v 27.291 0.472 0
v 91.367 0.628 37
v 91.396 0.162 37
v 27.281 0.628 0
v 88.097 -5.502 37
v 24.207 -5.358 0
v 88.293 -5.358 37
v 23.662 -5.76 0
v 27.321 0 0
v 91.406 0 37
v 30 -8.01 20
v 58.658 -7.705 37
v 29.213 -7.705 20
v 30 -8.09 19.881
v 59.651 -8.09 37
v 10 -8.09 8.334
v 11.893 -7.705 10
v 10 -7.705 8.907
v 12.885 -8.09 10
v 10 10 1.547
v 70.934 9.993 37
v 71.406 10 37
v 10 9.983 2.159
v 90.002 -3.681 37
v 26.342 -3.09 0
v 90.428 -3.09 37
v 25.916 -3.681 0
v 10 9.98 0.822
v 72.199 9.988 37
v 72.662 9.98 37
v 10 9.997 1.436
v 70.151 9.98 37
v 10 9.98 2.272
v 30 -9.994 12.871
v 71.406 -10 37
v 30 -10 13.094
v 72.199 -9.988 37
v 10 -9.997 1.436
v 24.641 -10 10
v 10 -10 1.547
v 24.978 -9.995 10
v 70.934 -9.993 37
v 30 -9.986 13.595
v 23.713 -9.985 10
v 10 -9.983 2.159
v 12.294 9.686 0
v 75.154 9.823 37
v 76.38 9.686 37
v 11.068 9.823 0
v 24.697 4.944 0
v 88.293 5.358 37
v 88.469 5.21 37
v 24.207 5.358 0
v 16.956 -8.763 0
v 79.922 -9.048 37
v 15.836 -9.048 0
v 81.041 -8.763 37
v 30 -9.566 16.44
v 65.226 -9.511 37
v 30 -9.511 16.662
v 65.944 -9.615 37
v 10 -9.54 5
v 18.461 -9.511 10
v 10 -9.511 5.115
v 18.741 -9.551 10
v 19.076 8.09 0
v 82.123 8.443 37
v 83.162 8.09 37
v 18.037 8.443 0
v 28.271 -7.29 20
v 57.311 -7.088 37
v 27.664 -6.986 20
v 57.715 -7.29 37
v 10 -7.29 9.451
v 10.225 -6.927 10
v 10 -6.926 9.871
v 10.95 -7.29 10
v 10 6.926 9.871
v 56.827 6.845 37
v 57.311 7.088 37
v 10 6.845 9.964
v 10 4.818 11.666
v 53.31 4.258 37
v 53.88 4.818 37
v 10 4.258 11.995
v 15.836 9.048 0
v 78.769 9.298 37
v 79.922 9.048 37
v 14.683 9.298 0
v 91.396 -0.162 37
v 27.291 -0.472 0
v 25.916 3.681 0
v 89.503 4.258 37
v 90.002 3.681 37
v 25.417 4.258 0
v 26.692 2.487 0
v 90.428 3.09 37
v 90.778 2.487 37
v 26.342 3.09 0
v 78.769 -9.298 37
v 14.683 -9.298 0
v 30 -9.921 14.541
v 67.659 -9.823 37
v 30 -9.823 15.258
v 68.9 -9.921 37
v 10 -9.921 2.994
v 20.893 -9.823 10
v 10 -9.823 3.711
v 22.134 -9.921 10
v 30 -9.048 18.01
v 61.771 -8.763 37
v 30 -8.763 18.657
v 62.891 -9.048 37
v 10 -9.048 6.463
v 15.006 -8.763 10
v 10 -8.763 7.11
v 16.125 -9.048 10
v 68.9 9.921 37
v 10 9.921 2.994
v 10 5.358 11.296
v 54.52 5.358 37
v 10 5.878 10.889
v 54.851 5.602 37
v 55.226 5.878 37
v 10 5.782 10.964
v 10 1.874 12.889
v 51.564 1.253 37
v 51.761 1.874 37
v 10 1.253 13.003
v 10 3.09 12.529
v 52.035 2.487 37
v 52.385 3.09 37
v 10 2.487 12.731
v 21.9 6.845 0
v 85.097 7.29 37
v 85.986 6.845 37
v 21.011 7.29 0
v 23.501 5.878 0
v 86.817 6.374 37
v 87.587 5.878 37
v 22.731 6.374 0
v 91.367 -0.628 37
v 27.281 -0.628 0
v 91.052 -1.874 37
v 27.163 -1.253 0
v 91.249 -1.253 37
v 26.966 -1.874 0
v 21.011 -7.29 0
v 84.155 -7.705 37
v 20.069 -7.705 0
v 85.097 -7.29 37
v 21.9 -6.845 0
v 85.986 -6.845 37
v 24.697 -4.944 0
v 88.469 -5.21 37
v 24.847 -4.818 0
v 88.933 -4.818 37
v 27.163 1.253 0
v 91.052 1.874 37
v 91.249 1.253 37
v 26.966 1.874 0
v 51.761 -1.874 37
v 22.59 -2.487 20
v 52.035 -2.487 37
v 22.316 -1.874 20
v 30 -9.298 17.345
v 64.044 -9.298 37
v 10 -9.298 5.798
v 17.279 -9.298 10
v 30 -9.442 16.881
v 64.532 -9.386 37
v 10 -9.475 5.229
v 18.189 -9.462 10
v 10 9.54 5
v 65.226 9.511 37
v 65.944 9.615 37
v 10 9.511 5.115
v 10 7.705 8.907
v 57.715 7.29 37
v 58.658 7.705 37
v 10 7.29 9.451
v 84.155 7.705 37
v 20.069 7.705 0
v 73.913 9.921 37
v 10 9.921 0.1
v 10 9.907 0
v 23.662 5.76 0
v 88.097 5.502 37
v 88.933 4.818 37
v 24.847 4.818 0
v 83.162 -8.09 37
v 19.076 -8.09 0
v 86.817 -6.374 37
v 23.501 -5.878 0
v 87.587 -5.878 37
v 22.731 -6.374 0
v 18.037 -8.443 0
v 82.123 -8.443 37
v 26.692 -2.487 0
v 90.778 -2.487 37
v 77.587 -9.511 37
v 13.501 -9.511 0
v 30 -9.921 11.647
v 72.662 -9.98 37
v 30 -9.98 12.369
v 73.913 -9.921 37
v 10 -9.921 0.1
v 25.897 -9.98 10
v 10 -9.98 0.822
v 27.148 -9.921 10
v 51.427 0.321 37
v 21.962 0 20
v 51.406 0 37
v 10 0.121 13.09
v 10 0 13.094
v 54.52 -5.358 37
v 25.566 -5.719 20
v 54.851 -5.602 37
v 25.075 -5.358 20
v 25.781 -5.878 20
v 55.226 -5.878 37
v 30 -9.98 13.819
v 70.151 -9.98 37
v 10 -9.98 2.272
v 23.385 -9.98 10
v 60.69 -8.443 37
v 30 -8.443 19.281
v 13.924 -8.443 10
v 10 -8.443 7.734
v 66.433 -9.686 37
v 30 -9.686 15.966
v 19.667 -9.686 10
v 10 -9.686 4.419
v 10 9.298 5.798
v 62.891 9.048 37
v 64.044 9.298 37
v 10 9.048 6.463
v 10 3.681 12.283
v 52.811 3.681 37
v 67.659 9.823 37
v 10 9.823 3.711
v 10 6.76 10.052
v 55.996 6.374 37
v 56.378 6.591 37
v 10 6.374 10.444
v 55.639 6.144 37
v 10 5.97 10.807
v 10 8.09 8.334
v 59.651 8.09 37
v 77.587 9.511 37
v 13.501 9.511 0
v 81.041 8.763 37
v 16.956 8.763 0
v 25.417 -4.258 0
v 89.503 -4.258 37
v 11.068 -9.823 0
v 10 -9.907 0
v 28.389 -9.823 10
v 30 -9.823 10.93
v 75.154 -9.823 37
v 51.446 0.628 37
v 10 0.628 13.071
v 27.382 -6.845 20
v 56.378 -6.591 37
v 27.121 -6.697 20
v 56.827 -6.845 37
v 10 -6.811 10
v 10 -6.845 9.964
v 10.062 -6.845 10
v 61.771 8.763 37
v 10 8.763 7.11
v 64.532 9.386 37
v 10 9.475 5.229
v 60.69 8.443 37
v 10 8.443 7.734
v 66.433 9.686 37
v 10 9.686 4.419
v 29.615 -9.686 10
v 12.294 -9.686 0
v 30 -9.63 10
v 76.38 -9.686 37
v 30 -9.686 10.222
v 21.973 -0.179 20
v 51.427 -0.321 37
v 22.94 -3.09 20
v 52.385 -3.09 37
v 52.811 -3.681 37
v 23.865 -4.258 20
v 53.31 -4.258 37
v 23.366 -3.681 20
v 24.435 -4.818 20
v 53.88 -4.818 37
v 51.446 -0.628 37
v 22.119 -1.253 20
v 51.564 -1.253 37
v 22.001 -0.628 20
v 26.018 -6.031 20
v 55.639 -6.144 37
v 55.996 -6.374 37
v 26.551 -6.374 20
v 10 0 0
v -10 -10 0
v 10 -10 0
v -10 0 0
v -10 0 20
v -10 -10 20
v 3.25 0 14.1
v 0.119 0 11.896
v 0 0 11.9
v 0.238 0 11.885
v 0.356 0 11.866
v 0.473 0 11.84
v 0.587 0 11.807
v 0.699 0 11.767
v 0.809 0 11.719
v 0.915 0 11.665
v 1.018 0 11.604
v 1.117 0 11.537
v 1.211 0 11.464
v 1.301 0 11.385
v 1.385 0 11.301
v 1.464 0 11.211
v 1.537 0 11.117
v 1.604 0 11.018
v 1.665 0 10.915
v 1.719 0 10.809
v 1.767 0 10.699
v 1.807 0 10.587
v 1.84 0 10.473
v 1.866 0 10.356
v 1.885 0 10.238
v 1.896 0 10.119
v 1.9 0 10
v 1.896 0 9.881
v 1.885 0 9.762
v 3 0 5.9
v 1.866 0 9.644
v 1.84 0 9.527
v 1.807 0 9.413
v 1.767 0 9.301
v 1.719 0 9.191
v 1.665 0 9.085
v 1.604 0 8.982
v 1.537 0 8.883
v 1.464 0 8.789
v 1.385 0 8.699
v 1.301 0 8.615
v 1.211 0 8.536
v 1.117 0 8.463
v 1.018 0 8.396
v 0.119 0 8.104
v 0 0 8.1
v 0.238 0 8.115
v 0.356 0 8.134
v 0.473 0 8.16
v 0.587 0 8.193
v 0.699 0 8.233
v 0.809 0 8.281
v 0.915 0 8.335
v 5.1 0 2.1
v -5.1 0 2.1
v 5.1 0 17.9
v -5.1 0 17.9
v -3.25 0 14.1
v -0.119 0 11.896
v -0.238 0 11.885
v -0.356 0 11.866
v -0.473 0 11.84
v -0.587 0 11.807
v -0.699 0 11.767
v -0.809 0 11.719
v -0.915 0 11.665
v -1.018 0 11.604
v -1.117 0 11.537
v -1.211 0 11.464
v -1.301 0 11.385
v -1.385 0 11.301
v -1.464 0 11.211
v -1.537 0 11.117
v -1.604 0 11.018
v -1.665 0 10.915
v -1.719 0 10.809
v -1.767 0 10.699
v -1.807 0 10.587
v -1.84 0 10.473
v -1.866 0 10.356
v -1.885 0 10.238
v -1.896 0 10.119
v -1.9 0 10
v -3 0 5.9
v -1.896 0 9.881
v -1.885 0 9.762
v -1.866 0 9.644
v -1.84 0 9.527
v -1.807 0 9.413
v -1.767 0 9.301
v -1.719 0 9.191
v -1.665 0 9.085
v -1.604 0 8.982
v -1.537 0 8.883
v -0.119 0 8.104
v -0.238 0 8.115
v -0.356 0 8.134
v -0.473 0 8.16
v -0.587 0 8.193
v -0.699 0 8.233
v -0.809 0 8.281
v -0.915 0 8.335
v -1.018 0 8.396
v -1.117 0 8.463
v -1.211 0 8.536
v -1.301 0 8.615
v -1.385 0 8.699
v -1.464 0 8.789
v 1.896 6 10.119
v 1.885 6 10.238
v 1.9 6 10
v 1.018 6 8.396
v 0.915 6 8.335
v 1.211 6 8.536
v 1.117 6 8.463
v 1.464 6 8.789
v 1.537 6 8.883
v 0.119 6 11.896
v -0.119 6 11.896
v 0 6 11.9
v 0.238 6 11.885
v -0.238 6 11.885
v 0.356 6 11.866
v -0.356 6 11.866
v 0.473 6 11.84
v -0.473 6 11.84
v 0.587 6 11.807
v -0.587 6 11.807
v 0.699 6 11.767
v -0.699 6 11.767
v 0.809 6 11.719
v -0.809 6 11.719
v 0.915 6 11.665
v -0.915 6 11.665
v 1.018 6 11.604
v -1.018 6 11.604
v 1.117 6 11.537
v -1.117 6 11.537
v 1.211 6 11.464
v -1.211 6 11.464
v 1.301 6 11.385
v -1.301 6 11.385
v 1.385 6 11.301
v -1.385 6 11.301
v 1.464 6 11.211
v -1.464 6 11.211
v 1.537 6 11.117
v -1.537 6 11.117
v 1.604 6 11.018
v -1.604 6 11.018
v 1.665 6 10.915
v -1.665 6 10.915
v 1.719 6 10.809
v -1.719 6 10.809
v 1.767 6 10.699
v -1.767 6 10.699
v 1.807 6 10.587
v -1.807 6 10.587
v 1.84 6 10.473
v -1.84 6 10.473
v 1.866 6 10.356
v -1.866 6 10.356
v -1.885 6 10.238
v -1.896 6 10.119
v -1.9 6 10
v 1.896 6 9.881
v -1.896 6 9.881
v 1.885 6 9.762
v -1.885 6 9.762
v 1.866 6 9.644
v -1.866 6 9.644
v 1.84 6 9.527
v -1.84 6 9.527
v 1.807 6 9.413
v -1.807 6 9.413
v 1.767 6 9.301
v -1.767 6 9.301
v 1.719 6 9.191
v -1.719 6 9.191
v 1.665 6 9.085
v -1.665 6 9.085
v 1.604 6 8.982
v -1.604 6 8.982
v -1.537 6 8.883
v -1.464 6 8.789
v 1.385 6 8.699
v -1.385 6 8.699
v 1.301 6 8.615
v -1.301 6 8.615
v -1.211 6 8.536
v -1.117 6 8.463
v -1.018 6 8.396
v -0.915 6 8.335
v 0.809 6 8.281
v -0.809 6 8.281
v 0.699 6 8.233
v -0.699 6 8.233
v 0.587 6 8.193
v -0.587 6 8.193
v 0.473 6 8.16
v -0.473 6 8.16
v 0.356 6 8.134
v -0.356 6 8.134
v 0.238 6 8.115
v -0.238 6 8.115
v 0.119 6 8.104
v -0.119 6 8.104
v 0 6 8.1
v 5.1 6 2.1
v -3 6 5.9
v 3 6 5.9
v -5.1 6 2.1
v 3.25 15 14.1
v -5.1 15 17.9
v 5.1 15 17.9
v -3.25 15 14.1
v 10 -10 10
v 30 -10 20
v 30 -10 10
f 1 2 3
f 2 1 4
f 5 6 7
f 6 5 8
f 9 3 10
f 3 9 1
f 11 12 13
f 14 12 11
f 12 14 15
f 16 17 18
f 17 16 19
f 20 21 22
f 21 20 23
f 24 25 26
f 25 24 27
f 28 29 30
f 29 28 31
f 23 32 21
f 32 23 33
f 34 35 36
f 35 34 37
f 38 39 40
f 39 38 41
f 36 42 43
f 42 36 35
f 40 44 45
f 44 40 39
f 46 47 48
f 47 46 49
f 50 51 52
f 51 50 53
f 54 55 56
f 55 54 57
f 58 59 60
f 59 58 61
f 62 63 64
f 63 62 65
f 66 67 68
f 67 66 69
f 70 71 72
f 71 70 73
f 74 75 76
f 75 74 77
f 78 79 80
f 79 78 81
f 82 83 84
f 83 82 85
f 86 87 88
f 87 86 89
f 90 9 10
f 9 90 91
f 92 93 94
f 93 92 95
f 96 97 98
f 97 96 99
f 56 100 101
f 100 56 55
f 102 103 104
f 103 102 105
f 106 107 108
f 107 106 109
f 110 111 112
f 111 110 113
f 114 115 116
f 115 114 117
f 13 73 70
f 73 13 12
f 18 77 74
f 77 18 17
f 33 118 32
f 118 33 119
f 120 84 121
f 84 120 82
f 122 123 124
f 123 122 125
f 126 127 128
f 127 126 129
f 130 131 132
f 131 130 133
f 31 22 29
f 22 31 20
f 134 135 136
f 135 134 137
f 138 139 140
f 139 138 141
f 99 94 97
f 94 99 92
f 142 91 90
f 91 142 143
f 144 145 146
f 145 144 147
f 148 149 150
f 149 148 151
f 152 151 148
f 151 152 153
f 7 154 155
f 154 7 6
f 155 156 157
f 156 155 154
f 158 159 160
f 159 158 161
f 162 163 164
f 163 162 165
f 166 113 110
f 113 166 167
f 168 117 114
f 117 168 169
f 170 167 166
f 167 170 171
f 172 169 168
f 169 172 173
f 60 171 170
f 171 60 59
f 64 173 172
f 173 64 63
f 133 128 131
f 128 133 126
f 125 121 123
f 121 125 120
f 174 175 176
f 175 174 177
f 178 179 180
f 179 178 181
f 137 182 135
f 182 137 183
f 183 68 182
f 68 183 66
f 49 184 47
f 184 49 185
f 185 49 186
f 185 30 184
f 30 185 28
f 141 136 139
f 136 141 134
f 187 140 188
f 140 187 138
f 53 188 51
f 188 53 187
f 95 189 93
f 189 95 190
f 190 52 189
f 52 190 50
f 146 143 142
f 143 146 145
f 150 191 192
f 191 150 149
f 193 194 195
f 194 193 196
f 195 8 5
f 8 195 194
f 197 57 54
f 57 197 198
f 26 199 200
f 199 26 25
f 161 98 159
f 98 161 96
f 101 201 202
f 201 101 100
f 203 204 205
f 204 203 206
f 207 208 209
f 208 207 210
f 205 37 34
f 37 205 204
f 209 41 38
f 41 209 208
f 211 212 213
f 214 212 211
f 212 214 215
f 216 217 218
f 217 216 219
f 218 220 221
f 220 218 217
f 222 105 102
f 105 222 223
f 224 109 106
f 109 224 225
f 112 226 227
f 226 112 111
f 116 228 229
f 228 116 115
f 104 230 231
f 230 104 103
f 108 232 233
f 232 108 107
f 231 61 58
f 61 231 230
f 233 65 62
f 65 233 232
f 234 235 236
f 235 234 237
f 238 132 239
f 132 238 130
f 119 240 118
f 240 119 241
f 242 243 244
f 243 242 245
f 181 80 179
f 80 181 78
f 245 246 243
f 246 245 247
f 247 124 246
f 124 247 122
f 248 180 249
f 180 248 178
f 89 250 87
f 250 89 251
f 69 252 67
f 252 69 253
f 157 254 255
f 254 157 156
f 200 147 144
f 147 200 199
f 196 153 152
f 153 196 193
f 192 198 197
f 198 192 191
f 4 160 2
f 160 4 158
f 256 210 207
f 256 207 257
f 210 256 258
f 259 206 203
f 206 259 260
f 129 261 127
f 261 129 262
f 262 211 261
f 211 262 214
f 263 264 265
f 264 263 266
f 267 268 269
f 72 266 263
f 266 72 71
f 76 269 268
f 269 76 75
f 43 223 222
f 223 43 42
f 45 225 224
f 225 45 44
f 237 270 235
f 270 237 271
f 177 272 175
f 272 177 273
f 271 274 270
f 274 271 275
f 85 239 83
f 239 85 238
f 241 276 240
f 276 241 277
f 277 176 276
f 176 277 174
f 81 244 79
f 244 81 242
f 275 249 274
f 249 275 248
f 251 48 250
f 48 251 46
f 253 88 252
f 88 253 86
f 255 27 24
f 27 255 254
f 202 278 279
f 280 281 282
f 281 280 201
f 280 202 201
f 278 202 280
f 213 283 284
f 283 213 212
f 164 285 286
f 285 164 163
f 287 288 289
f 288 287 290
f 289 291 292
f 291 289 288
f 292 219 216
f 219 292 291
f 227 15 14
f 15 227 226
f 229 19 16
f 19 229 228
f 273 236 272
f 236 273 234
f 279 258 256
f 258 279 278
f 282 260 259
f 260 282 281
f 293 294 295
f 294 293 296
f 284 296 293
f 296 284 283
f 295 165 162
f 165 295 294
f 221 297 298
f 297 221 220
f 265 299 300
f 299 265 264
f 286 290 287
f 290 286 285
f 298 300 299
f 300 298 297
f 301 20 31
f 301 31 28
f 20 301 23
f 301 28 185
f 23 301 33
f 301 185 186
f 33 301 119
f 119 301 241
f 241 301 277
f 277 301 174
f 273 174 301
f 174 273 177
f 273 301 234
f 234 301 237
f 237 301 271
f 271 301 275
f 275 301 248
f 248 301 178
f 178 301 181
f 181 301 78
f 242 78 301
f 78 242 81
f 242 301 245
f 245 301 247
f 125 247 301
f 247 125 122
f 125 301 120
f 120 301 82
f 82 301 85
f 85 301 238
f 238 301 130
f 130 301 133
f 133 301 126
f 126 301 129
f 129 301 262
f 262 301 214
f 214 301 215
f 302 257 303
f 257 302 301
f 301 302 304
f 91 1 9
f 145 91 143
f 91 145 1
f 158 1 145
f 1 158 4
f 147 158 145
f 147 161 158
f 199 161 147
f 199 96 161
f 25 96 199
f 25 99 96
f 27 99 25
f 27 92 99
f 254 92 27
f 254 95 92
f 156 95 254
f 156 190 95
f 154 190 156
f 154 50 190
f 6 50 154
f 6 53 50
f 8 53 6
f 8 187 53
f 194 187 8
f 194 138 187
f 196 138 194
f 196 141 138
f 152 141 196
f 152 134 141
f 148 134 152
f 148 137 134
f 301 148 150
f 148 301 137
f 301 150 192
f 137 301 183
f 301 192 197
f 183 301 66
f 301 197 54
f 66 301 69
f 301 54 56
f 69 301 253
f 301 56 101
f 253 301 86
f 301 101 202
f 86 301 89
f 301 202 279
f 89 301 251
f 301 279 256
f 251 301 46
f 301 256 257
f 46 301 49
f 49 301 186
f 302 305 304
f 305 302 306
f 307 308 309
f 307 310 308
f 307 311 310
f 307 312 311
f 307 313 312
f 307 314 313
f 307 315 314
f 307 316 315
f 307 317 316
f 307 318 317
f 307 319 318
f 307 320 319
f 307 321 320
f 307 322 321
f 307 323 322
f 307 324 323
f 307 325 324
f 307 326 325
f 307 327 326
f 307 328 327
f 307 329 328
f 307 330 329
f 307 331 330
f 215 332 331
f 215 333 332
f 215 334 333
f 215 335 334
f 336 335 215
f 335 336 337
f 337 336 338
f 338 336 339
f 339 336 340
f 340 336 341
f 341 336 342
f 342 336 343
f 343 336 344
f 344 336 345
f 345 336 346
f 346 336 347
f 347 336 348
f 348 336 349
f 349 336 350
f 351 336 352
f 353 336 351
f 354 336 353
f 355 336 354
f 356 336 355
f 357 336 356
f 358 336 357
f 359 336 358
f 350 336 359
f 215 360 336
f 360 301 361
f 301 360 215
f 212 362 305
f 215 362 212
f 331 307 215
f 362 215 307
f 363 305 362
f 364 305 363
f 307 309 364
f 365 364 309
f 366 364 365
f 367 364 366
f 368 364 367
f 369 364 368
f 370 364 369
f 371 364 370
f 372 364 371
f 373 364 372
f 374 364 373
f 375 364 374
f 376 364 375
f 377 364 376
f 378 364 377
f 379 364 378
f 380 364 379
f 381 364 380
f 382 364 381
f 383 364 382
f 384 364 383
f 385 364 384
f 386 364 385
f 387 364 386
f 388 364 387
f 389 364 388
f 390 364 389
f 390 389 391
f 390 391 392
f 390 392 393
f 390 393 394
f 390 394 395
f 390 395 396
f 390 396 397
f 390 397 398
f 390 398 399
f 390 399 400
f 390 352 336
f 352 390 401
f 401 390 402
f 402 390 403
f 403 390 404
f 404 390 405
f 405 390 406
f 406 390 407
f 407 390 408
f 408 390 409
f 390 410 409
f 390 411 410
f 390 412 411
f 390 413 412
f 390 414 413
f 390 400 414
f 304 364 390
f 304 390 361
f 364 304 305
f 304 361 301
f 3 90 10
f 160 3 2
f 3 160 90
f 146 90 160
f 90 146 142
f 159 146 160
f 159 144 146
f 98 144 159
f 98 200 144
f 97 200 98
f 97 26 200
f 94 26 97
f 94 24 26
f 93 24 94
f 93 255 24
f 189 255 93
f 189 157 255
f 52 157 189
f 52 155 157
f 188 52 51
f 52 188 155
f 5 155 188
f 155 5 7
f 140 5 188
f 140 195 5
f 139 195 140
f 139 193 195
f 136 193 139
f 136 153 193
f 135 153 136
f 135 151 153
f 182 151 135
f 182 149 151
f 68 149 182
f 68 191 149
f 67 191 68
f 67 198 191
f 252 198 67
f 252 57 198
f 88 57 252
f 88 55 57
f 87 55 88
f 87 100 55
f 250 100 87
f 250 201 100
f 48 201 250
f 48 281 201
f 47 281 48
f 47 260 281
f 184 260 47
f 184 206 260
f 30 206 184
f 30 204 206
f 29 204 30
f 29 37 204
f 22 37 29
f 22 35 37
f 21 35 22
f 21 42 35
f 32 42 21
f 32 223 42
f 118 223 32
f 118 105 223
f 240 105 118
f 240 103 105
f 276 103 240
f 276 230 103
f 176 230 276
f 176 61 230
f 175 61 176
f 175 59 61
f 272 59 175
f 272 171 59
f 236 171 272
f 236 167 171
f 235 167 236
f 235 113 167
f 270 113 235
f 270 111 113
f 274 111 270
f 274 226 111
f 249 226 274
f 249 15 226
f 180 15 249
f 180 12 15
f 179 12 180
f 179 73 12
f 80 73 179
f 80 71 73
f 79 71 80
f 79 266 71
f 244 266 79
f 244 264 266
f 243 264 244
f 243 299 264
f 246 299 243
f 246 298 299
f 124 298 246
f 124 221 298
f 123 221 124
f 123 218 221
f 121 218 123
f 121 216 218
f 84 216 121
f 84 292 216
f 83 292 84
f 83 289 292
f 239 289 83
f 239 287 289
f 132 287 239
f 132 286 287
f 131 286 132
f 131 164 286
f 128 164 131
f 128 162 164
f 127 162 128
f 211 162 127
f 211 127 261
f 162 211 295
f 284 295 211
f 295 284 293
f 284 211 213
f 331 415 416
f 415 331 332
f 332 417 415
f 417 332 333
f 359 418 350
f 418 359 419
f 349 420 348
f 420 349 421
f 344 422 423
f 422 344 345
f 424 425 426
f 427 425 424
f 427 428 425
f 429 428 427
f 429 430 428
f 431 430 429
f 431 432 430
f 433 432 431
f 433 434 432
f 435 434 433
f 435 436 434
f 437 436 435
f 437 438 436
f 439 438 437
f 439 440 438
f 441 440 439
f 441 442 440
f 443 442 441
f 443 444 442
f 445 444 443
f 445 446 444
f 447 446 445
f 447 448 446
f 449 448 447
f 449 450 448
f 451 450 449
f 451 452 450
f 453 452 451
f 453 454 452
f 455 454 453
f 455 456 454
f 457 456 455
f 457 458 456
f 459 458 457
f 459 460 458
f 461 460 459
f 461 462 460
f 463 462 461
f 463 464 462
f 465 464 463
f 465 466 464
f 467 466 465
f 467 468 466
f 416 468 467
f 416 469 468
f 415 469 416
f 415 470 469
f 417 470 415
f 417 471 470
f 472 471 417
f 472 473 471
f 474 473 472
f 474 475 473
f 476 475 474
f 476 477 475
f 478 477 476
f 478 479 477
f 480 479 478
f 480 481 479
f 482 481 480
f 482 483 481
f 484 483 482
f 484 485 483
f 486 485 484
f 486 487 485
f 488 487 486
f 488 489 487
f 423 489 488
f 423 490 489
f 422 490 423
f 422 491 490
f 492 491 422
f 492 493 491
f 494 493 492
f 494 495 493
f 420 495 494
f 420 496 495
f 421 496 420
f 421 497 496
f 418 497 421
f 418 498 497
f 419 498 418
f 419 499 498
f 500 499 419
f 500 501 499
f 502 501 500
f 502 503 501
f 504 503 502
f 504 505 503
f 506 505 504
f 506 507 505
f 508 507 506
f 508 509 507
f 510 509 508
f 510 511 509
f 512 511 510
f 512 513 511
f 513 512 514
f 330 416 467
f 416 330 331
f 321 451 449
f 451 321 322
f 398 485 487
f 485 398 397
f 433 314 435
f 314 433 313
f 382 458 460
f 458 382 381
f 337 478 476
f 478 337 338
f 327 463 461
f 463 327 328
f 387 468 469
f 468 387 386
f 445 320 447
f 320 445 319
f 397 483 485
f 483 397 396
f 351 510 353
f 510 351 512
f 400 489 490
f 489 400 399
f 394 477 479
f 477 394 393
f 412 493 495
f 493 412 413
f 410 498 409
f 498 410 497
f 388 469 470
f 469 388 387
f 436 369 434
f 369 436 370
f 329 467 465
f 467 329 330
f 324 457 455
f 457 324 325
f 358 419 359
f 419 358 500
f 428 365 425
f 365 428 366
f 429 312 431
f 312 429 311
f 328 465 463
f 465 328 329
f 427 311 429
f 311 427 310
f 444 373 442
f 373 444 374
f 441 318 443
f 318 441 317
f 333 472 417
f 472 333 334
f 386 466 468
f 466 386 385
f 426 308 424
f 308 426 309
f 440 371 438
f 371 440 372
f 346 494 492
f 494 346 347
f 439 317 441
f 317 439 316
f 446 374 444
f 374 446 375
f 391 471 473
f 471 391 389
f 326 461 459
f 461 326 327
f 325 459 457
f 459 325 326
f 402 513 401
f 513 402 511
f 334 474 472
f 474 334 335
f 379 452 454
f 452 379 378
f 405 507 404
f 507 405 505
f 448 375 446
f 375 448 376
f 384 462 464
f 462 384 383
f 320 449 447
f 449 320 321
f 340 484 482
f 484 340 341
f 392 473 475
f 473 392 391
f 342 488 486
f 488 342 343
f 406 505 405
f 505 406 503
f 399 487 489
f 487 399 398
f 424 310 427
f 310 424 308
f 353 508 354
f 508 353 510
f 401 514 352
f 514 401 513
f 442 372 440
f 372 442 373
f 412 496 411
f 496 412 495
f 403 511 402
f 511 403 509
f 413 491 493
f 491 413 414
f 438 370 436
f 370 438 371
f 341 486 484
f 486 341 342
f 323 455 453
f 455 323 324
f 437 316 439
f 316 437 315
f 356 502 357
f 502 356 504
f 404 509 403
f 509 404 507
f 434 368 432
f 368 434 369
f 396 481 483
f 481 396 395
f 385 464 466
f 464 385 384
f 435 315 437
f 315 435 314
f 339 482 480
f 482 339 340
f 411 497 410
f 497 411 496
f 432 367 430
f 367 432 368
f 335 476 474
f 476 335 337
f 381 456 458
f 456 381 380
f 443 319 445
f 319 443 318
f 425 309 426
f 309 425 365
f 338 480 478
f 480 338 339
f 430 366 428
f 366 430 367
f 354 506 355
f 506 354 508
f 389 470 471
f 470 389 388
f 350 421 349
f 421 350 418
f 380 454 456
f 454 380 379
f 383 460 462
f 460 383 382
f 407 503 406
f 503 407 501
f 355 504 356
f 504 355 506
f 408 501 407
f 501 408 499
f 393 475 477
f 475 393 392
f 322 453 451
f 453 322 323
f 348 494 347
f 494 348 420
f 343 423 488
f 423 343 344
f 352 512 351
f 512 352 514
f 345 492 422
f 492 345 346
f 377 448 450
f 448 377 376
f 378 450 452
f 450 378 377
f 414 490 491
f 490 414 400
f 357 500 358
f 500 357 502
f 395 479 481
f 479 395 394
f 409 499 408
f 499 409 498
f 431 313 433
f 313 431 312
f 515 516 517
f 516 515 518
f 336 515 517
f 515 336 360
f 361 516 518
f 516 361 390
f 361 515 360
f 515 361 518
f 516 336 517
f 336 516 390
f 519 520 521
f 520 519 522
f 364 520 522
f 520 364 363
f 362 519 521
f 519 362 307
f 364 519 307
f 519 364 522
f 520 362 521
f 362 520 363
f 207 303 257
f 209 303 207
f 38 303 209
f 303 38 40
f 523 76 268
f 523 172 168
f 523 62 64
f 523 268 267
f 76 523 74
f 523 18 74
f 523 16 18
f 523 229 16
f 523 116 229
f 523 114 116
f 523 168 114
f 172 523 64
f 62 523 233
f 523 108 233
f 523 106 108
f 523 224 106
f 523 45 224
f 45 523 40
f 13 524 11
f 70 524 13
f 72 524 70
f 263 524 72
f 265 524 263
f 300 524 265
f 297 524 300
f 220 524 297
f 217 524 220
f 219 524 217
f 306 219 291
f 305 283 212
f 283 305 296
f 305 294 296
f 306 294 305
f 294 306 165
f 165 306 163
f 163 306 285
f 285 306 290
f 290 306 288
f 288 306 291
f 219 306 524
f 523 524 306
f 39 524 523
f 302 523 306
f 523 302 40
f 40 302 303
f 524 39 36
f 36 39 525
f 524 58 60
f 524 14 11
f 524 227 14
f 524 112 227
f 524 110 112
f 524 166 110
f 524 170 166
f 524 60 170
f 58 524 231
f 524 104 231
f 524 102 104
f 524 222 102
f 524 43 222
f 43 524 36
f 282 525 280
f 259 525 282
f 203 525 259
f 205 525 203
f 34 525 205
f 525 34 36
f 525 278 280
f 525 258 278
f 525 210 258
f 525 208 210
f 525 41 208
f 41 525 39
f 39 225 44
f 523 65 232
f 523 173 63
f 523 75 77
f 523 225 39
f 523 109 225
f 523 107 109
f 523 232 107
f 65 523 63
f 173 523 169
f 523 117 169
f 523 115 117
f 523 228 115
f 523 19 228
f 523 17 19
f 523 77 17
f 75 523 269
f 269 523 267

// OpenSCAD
// file: trapezoid.scad
module trap(base,top,height, depth)
{

    polyhedron(
        points=[
            //front
            [0,0,0],
            [base,0,0],
            [(base/2)+(top/2),height,0],
            [(base/2)-(top/2),height,0],

            //rear
            [0,0,depth],
            [base,0,depth],
            [(base/2)+(top/2),height,depth],
            [(base/2)-(top/2),height,depth],
        ],

        faces=[
            [0,1,2,3], //front
            [7,6,5,4], //rear
            [0,4,5,1], //bottom
            [2,6,7,3], //top
            [0,3,7,4], //left
            [5,6,2,1], //right
            
        ]

    );
}

trap(20,5,5,20);
// main file
use <trapezoid.scad>;
$fn=100;

//translate([0,0,10])rotate([-90,0,0])  difference()
//{

//translate([-110.3,-20,-5]) import("/home/psy/Downloads/CR-10_Cable_strain_relief.stl");
    
//translate([-200,-200,-10]) cube([1000,1000,10]);

//}

//pin
color("red")  translate([0,6,10]) rotate([90,0,0]) cylinder(d=3.8,h=6);

color("red") translate([-5.1,6,2.1]) rotate([90,0,0]) trap(10.2, 6, 3.8,15);

color("red") translate([+5.1,15,17.9]) rotate([90,180,0]) trap(10.2,6.5,3.8,16);

//pinnetjes vasthouder
translate([-10,-10,0])cube([20,10,20]);

translate([0,-10,10])cube([30,10,10]);


difference()
{
    translate([-10,0,-10]) rotate([0,60,0]) cylinder(d=20,h=150);
    translate([-10,0,0])cube([20,10,20]);
    
    //-top
    translate([-20,-20,-20]) cube([50,40,20]);
    
    //-floor
    translate([-100,-100,37]) cube([2000,2000,2000]);

    //-inside
    translate([-30,-10,0]) cube([20,20,20]);
}
